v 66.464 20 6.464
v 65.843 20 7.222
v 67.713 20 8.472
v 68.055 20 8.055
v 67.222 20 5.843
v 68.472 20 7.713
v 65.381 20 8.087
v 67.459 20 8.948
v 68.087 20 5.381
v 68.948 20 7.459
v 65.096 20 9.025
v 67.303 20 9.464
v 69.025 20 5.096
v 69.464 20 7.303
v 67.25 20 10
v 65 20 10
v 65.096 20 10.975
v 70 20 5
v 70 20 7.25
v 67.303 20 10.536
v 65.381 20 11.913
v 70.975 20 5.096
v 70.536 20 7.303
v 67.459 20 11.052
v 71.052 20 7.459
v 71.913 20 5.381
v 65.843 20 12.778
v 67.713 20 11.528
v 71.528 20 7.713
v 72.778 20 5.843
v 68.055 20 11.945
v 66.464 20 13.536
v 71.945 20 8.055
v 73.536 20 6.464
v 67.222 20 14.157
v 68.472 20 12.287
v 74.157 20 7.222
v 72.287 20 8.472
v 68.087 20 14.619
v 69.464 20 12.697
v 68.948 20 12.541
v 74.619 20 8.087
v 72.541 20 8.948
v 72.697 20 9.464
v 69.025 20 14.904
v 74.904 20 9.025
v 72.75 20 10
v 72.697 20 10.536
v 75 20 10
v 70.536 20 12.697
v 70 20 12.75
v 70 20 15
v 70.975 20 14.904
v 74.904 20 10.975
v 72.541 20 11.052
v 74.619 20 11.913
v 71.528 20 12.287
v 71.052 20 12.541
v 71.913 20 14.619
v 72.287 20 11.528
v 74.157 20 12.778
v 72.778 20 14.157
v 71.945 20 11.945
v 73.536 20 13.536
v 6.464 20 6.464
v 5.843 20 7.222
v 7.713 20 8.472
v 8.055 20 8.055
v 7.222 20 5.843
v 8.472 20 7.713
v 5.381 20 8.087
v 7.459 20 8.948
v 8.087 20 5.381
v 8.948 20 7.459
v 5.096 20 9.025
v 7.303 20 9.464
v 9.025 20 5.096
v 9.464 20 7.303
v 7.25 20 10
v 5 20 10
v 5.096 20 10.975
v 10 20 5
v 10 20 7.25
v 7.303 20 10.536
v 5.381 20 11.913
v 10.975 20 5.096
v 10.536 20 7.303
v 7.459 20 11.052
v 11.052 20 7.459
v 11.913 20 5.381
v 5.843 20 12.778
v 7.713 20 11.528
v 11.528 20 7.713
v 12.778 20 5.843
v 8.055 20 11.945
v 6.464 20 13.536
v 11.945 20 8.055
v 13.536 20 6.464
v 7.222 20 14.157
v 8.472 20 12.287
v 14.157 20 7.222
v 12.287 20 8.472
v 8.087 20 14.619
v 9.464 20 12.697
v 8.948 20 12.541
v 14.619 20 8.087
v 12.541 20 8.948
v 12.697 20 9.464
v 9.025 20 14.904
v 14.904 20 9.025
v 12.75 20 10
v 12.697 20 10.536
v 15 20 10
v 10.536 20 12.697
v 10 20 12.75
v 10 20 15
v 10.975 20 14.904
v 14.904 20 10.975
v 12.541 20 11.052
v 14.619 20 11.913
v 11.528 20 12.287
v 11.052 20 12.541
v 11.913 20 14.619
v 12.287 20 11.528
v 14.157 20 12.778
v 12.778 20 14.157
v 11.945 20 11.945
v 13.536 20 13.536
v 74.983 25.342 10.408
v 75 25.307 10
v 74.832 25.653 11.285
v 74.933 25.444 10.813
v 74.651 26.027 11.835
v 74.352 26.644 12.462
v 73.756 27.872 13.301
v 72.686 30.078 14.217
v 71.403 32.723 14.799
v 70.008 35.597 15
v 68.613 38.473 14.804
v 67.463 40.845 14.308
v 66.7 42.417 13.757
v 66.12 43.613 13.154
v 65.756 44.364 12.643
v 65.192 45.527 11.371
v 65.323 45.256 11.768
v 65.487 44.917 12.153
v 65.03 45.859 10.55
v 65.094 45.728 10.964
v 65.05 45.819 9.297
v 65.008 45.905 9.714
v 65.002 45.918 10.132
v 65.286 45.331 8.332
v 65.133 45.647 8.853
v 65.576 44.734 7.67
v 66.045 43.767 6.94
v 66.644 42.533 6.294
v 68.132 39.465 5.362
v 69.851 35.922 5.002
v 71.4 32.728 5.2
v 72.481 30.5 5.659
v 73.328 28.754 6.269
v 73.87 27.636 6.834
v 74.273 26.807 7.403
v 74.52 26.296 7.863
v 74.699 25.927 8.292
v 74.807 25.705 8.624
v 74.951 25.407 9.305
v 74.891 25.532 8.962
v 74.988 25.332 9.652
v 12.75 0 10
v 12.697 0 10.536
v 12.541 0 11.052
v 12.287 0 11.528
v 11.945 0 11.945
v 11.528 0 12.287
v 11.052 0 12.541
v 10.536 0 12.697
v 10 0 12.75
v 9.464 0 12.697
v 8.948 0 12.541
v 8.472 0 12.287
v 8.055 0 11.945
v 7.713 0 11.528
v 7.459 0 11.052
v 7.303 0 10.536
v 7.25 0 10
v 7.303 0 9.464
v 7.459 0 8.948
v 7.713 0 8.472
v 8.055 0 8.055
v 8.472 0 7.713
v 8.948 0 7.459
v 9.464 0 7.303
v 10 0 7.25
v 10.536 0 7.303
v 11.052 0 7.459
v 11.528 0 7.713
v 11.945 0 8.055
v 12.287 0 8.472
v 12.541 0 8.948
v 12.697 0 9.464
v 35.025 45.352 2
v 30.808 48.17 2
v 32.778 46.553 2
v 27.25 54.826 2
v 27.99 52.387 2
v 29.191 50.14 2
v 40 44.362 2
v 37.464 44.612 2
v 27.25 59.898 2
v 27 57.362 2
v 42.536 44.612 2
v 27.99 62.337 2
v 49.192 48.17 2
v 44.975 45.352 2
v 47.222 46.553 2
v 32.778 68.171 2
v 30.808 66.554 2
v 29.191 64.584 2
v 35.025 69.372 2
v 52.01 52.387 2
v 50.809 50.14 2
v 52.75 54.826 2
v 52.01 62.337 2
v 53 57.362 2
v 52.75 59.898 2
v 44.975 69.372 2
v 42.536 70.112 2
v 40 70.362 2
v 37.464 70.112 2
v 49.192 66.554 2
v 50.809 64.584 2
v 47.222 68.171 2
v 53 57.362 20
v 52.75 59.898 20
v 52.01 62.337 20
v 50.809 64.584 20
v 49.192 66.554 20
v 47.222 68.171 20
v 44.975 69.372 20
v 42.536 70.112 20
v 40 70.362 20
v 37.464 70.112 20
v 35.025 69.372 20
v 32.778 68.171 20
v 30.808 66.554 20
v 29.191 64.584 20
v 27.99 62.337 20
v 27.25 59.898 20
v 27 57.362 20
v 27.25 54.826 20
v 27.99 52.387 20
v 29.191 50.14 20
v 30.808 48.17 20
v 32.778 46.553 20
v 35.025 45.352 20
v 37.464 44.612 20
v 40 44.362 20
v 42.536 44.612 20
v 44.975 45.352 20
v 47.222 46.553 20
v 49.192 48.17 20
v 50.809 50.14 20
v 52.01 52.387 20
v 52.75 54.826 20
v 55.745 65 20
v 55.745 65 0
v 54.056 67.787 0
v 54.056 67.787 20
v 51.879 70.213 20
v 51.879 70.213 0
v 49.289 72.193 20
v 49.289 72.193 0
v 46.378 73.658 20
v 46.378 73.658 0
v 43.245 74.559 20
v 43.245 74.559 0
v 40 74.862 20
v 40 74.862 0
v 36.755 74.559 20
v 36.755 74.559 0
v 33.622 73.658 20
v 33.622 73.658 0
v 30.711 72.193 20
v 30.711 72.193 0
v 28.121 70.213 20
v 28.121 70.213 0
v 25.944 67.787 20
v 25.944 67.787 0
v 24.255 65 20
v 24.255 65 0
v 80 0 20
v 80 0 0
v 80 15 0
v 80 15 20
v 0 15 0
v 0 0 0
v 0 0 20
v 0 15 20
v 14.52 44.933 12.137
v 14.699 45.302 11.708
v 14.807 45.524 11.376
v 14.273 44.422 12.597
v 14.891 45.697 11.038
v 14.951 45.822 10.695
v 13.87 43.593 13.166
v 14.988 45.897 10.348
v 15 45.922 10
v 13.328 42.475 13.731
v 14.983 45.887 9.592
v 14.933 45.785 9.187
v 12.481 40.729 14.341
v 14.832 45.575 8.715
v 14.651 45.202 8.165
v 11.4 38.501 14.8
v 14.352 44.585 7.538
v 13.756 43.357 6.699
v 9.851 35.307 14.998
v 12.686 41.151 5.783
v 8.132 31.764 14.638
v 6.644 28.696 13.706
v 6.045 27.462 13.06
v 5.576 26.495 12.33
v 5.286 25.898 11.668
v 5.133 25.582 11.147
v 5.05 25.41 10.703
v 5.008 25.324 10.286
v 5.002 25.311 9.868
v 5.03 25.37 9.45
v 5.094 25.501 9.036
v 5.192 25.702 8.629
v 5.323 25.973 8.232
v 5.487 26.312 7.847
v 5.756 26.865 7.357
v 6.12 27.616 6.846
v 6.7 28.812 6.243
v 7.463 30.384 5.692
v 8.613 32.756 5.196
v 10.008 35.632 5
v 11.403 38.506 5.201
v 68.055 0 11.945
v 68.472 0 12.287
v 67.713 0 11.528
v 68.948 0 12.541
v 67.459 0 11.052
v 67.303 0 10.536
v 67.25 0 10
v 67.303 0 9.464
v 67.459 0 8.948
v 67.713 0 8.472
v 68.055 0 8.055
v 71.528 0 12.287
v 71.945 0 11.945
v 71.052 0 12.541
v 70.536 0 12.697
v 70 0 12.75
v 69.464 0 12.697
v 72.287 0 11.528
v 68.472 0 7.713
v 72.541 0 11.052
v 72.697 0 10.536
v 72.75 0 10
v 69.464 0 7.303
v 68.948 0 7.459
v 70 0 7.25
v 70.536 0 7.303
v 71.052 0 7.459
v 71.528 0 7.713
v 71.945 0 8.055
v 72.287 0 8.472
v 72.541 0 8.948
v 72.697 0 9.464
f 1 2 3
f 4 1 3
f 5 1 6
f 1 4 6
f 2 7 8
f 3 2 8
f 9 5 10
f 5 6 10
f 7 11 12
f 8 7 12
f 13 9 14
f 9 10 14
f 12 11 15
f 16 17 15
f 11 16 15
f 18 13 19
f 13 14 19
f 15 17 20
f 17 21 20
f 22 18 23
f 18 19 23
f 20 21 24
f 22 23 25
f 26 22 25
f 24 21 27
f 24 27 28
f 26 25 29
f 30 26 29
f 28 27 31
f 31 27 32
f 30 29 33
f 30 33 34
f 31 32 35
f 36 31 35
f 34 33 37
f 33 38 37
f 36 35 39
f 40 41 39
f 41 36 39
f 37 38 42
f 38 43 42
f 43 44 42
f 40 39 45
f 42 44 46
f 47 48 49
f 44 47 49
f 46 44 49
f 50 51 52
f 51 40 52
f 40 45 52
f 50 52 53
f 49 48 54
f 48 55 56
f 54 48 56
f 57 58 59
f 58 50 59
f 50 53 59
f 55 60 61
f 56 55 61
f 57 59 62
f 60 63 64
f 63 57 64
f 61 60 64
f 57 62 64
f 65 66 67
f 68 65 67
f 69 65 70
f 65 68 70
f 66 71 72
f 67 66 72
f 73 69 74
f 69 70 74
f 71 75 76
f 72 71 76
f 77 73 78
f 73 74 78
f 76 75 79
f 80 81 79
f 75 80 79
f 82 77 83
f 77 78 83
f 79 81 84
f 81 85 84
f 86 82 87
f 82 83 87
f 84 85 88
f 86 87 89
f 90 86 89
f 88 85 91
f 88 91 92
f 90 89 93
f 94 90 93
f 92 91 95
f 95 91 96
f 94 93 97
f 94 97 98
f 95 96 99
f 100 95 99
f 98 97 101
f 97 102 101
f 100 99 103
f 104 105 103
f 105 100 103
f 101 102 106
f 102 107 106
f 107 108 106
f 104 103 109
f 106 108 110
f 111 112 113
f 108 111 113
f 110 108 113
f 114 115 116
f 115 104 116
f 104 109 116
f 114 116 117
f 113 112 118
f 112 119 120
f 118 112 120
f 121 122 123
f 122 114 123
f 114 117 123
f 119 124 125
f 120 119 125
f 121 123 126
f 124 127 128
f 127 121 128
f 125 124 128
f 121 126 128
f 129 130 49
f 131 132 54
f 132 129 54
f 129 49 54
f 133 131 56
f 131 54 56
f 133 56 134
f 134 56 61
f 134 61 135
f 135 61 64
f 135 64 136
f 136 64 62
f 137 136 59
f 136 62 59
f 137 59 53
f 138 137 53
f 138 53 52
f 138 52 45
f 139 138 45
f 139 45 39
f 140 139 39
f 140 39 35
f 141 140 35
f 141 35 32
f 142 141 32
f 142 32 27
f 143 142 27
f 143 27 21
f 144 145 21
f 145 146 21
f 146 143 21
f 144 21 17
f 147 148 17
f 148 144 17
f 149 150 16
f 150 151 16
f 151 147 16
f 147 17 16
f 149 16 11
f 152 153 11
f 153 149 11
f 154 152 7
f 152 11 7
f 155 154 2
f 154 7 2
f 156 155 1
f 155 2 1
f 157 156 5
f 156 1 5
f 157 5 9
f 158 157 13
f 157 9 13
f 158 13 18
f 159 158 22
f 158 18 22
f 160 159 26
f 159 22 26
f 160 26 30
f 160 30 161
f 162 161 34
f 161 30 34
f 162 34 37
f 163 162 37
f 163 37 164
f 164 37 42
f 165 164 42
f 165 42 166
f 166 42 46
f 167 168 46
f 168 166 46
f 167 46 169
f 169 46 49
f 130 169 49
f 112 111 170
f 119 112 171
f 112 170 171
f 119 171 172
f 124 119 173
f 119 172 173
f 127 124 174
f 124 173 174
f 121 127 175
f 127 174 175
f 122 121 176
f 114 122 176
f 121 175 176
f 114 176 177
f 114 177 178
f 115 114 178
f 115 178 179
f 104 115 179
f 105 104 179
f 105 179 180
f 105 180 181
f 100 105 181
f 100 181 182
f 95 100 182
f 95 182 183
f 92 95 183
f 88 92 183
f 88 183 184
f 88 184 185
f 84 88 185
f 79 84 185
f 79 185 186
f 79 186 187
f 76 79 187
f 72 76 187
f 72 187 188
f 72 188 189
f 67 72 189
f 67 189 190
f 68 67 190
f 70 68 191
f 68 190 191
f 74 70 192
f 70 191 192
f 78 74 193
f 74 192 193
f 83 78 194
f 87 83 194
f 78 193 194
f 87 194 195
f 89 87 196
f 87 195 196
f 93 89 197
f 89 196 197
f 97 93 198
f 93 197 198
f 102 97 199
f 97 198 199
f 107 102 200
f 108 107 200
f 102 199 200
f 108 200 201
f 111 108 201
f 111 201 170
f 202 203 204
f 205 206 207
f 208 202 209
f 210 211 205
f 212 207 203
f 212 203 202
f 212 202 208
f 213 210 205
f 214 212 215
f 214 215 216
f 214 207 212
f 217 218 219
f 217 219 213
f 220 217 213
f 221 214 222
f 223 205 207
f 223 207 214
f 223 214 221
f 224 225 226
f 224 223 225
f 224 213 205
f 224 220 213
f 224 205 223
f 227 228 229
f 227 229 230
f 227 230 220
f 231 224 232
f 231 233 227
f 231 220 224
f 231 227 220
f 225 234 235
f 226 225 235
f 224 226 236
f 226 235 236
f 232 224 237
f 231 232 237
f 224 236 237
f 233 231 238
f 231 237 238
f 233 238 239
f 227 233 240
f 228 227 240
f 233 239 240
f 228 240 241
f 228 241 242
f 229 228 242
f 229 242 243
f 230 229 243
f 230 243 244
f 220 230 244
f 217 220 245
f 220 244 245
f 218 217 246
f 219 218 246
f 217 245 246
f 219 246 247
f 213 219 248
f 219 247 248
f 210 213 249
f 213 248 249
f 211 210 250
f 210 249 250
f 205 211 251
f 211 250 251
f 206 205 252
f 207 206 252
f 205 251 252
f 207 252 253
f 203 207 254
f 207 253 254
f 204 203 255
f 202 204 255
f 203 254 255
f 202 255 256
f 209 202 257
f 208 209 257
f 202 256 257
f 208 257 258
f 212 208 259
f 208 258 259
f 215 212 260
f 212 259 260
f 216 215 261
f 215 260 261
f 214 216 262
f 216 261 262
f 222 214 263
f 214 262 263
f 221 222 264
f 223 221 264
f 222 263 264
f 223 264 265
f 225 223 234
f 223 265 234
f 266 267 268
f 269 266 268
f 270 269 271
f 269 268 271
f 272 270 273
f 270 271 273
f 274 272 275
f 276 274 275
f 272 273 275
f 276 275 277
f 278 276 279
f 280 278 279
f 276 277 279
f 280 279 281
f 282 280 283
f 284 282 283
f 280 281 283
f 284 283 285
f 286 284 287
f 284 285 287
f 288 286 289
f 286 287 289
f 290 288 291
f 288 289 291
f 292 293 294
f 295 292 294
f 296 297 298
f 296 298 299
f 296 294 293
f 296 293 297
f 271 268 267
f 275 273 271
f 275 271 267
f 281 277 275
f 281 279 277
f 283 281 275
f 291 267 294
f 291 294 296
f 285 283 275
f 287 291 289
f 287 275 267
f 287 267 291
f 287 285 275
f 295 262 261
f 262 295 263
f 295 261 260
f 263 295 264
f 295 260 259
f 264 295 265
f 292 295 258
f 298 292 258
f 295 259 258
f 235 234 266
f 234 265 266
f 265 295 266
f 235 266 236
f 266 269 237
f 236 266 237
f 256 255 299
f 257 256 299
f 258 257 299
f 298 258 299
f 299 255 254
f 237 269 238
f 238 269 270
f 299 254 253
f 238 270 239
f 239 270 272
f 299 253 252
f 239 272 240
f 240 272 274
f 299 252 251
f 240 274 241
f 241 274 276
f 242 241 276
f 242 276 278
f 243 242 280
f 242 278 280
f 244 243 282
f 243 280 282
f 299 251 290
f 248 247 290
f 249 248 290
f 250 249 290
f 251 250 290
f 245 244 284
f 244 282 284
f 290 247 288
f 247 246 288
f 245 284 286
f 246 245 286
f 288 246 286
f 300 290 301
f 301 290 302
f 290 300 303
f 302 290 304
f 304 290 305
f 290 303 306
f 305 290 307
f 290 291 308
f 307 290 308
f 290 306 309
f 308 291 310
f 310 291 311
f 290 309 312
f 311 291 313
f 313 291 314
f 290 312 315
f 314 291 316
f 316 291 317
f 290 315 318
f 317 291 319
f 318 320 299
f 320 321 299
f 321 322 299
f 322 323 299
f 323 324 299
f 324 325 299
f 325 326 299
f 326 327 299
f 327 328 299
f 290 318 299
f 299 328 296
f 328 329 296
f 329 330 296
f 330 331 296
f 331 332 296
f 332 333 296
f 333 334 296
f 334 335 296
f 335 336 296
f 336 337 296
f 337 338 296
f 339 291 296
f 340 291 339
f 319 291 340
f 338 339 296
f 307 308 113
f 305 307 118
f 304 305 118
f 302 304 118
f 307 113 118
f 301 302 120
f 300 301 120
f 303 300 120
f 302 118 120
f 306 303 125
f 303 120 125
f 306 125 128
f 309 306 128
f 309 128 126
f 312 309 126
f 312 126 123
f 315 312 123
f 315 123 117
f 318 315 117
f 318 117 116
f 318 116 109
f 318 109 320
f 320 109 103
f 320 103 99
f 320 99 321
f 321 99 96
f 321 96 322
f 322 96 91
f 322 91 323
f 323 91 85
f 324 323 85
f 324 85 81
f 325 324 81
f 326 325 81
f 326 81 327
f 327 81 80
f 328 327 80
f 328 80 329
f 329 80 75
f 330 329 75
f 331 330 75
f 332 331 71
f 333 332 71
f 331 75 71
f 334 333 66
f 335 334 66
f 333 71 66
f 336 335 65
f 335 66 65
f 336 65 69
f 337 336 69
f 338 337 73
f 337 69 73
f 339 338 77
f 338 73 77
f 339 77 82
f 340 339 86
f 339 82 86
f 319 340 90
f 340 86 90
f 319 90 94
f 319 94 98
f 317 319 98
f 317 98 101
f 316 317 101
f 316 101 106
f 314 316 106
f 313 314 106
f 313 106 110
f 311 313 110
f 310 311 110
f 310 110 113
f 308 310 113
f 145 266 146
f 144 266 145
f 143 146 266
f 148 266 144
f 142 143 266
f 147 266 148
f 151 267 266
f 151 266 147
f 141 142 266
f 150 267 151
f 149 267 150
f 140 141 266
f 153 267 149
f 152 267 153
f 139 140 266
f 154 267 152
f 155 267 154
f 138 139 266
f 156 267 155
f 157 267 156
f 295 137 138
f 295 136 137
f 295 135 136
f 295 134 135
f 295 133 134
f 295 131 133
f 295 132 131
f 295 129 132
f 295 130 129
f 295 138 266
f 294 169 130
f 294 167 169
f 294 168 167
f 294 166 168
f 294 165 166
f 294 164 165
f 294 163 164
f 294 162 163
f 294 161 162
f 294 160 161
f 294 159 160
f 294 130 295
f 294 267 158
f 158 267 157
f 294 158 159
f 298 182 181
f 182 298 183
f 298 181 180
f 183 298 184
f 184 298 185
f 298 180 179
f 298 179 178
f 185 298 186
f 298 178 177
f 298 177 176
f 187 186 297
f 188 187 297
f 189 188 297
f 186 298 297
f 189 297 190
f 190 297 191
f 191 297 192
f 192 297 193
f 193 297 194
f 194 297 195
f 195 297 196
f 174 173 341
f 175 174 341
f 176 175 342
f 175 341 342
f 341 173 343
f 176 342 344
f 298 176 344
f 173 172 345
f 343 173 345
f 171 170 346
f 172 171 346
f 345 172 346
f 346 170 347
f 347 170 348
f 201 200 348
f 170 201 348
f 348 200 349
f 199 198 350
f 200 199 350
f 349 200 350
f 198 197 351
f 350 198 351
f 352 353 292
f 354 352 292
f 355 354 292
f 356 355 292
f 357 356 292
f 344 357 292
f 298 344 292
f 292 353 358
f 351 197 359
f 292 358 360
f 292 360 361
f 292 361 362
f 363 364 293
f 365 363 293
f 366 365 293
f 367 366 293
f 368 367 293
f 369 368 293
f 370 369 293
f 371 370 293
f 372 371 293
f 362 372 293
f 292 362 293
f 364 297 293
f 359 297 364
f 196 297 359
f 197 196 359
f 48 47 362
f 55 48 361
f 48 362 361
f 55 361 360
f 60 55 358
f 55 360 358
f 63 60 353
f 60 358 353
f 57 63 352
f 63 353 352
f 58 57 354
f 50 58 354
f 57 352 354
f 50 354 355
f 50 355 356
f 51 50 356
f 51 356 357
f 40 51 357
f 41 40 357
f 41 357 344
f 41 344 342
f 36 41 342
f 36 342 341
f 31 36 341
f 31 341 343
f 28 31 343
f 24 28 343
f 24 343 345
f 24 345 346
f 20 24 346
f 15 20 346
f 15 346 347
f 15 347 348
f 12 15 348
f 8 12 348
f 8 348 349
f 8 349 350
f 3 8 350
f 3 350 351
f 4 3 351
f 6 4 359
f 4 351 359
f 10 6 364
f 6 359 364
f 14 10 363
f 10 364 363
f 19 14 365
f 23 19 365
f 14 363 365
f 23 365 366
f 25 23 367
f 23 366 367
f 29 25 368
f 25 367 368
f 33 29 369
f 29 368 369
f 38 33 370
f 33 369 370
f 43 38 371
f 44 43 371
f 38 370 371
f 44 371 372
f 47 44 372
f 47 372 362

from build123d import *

# Parameters (mm, degrees)
PAD_DEPTH       = 20
SKETCH001_R     = 13
POCKET_DEPTH    = 18
SKETCH002_R     = 2.75
POCKET001_DEPTH = 74.863063
POCKET002_START = -20
SKETCH003_R     = 5
POCKET002_DEPTH = 50


with BuildPart() as part:
    # Sketch → Pad (new body)
    with BuildSketch(Plane.XY):
        with BuildLine():
            Line((0, 0), (0, 15))
            Line((24.254781, 65), (0, 15))
            ThreePointArc((55.745219, 65), (40, 74.862063), (24.254781, 65))
            Line((55.745219, 65), (80, 15))
            Line((80, 0), (80, 15))
            Line((0, 0), (80, 0))
        make_face()
    extrude(amount=PAD_DEPTH)

    # Sketch001 (on Face8 of Pad) → Pocket (cut)
    with BuildSketch(Plane.XY.offset(20)):
        with Locations((40, 57.362063)):
            Circle(SKETCH001_R)
    extrude(amount=-POCKET_DEPTH, mode=Mode.SUBTRACT)

    # Sketch002 (on Face7 of Pocket) → Pocket001 (cut, through all)
    with BuildSketch(Plane.XZ):
        with Locations((10, 10)):
            Circle(SKETCH002_R)
        with Locations((70, 10)):
            Circle(SKETCH002_R)
    extrude(amount=-POCKET001_DEPTH, mode=Mode.SUBTRACT)

    # Sketch003 → Pocket002 (cut)
    with BuildSketch(Plane.XZ.offset(POCKET002_START)):
        with Locations((70, 10)):
            Circle(SKETCH003_R)
        with Locations((10, 10)):
            Circle(SKETCH003_R)
    extrude(amount=-POCKET002_DEPTH, mode=Mode.SUBTRACT)


solid = part.part
